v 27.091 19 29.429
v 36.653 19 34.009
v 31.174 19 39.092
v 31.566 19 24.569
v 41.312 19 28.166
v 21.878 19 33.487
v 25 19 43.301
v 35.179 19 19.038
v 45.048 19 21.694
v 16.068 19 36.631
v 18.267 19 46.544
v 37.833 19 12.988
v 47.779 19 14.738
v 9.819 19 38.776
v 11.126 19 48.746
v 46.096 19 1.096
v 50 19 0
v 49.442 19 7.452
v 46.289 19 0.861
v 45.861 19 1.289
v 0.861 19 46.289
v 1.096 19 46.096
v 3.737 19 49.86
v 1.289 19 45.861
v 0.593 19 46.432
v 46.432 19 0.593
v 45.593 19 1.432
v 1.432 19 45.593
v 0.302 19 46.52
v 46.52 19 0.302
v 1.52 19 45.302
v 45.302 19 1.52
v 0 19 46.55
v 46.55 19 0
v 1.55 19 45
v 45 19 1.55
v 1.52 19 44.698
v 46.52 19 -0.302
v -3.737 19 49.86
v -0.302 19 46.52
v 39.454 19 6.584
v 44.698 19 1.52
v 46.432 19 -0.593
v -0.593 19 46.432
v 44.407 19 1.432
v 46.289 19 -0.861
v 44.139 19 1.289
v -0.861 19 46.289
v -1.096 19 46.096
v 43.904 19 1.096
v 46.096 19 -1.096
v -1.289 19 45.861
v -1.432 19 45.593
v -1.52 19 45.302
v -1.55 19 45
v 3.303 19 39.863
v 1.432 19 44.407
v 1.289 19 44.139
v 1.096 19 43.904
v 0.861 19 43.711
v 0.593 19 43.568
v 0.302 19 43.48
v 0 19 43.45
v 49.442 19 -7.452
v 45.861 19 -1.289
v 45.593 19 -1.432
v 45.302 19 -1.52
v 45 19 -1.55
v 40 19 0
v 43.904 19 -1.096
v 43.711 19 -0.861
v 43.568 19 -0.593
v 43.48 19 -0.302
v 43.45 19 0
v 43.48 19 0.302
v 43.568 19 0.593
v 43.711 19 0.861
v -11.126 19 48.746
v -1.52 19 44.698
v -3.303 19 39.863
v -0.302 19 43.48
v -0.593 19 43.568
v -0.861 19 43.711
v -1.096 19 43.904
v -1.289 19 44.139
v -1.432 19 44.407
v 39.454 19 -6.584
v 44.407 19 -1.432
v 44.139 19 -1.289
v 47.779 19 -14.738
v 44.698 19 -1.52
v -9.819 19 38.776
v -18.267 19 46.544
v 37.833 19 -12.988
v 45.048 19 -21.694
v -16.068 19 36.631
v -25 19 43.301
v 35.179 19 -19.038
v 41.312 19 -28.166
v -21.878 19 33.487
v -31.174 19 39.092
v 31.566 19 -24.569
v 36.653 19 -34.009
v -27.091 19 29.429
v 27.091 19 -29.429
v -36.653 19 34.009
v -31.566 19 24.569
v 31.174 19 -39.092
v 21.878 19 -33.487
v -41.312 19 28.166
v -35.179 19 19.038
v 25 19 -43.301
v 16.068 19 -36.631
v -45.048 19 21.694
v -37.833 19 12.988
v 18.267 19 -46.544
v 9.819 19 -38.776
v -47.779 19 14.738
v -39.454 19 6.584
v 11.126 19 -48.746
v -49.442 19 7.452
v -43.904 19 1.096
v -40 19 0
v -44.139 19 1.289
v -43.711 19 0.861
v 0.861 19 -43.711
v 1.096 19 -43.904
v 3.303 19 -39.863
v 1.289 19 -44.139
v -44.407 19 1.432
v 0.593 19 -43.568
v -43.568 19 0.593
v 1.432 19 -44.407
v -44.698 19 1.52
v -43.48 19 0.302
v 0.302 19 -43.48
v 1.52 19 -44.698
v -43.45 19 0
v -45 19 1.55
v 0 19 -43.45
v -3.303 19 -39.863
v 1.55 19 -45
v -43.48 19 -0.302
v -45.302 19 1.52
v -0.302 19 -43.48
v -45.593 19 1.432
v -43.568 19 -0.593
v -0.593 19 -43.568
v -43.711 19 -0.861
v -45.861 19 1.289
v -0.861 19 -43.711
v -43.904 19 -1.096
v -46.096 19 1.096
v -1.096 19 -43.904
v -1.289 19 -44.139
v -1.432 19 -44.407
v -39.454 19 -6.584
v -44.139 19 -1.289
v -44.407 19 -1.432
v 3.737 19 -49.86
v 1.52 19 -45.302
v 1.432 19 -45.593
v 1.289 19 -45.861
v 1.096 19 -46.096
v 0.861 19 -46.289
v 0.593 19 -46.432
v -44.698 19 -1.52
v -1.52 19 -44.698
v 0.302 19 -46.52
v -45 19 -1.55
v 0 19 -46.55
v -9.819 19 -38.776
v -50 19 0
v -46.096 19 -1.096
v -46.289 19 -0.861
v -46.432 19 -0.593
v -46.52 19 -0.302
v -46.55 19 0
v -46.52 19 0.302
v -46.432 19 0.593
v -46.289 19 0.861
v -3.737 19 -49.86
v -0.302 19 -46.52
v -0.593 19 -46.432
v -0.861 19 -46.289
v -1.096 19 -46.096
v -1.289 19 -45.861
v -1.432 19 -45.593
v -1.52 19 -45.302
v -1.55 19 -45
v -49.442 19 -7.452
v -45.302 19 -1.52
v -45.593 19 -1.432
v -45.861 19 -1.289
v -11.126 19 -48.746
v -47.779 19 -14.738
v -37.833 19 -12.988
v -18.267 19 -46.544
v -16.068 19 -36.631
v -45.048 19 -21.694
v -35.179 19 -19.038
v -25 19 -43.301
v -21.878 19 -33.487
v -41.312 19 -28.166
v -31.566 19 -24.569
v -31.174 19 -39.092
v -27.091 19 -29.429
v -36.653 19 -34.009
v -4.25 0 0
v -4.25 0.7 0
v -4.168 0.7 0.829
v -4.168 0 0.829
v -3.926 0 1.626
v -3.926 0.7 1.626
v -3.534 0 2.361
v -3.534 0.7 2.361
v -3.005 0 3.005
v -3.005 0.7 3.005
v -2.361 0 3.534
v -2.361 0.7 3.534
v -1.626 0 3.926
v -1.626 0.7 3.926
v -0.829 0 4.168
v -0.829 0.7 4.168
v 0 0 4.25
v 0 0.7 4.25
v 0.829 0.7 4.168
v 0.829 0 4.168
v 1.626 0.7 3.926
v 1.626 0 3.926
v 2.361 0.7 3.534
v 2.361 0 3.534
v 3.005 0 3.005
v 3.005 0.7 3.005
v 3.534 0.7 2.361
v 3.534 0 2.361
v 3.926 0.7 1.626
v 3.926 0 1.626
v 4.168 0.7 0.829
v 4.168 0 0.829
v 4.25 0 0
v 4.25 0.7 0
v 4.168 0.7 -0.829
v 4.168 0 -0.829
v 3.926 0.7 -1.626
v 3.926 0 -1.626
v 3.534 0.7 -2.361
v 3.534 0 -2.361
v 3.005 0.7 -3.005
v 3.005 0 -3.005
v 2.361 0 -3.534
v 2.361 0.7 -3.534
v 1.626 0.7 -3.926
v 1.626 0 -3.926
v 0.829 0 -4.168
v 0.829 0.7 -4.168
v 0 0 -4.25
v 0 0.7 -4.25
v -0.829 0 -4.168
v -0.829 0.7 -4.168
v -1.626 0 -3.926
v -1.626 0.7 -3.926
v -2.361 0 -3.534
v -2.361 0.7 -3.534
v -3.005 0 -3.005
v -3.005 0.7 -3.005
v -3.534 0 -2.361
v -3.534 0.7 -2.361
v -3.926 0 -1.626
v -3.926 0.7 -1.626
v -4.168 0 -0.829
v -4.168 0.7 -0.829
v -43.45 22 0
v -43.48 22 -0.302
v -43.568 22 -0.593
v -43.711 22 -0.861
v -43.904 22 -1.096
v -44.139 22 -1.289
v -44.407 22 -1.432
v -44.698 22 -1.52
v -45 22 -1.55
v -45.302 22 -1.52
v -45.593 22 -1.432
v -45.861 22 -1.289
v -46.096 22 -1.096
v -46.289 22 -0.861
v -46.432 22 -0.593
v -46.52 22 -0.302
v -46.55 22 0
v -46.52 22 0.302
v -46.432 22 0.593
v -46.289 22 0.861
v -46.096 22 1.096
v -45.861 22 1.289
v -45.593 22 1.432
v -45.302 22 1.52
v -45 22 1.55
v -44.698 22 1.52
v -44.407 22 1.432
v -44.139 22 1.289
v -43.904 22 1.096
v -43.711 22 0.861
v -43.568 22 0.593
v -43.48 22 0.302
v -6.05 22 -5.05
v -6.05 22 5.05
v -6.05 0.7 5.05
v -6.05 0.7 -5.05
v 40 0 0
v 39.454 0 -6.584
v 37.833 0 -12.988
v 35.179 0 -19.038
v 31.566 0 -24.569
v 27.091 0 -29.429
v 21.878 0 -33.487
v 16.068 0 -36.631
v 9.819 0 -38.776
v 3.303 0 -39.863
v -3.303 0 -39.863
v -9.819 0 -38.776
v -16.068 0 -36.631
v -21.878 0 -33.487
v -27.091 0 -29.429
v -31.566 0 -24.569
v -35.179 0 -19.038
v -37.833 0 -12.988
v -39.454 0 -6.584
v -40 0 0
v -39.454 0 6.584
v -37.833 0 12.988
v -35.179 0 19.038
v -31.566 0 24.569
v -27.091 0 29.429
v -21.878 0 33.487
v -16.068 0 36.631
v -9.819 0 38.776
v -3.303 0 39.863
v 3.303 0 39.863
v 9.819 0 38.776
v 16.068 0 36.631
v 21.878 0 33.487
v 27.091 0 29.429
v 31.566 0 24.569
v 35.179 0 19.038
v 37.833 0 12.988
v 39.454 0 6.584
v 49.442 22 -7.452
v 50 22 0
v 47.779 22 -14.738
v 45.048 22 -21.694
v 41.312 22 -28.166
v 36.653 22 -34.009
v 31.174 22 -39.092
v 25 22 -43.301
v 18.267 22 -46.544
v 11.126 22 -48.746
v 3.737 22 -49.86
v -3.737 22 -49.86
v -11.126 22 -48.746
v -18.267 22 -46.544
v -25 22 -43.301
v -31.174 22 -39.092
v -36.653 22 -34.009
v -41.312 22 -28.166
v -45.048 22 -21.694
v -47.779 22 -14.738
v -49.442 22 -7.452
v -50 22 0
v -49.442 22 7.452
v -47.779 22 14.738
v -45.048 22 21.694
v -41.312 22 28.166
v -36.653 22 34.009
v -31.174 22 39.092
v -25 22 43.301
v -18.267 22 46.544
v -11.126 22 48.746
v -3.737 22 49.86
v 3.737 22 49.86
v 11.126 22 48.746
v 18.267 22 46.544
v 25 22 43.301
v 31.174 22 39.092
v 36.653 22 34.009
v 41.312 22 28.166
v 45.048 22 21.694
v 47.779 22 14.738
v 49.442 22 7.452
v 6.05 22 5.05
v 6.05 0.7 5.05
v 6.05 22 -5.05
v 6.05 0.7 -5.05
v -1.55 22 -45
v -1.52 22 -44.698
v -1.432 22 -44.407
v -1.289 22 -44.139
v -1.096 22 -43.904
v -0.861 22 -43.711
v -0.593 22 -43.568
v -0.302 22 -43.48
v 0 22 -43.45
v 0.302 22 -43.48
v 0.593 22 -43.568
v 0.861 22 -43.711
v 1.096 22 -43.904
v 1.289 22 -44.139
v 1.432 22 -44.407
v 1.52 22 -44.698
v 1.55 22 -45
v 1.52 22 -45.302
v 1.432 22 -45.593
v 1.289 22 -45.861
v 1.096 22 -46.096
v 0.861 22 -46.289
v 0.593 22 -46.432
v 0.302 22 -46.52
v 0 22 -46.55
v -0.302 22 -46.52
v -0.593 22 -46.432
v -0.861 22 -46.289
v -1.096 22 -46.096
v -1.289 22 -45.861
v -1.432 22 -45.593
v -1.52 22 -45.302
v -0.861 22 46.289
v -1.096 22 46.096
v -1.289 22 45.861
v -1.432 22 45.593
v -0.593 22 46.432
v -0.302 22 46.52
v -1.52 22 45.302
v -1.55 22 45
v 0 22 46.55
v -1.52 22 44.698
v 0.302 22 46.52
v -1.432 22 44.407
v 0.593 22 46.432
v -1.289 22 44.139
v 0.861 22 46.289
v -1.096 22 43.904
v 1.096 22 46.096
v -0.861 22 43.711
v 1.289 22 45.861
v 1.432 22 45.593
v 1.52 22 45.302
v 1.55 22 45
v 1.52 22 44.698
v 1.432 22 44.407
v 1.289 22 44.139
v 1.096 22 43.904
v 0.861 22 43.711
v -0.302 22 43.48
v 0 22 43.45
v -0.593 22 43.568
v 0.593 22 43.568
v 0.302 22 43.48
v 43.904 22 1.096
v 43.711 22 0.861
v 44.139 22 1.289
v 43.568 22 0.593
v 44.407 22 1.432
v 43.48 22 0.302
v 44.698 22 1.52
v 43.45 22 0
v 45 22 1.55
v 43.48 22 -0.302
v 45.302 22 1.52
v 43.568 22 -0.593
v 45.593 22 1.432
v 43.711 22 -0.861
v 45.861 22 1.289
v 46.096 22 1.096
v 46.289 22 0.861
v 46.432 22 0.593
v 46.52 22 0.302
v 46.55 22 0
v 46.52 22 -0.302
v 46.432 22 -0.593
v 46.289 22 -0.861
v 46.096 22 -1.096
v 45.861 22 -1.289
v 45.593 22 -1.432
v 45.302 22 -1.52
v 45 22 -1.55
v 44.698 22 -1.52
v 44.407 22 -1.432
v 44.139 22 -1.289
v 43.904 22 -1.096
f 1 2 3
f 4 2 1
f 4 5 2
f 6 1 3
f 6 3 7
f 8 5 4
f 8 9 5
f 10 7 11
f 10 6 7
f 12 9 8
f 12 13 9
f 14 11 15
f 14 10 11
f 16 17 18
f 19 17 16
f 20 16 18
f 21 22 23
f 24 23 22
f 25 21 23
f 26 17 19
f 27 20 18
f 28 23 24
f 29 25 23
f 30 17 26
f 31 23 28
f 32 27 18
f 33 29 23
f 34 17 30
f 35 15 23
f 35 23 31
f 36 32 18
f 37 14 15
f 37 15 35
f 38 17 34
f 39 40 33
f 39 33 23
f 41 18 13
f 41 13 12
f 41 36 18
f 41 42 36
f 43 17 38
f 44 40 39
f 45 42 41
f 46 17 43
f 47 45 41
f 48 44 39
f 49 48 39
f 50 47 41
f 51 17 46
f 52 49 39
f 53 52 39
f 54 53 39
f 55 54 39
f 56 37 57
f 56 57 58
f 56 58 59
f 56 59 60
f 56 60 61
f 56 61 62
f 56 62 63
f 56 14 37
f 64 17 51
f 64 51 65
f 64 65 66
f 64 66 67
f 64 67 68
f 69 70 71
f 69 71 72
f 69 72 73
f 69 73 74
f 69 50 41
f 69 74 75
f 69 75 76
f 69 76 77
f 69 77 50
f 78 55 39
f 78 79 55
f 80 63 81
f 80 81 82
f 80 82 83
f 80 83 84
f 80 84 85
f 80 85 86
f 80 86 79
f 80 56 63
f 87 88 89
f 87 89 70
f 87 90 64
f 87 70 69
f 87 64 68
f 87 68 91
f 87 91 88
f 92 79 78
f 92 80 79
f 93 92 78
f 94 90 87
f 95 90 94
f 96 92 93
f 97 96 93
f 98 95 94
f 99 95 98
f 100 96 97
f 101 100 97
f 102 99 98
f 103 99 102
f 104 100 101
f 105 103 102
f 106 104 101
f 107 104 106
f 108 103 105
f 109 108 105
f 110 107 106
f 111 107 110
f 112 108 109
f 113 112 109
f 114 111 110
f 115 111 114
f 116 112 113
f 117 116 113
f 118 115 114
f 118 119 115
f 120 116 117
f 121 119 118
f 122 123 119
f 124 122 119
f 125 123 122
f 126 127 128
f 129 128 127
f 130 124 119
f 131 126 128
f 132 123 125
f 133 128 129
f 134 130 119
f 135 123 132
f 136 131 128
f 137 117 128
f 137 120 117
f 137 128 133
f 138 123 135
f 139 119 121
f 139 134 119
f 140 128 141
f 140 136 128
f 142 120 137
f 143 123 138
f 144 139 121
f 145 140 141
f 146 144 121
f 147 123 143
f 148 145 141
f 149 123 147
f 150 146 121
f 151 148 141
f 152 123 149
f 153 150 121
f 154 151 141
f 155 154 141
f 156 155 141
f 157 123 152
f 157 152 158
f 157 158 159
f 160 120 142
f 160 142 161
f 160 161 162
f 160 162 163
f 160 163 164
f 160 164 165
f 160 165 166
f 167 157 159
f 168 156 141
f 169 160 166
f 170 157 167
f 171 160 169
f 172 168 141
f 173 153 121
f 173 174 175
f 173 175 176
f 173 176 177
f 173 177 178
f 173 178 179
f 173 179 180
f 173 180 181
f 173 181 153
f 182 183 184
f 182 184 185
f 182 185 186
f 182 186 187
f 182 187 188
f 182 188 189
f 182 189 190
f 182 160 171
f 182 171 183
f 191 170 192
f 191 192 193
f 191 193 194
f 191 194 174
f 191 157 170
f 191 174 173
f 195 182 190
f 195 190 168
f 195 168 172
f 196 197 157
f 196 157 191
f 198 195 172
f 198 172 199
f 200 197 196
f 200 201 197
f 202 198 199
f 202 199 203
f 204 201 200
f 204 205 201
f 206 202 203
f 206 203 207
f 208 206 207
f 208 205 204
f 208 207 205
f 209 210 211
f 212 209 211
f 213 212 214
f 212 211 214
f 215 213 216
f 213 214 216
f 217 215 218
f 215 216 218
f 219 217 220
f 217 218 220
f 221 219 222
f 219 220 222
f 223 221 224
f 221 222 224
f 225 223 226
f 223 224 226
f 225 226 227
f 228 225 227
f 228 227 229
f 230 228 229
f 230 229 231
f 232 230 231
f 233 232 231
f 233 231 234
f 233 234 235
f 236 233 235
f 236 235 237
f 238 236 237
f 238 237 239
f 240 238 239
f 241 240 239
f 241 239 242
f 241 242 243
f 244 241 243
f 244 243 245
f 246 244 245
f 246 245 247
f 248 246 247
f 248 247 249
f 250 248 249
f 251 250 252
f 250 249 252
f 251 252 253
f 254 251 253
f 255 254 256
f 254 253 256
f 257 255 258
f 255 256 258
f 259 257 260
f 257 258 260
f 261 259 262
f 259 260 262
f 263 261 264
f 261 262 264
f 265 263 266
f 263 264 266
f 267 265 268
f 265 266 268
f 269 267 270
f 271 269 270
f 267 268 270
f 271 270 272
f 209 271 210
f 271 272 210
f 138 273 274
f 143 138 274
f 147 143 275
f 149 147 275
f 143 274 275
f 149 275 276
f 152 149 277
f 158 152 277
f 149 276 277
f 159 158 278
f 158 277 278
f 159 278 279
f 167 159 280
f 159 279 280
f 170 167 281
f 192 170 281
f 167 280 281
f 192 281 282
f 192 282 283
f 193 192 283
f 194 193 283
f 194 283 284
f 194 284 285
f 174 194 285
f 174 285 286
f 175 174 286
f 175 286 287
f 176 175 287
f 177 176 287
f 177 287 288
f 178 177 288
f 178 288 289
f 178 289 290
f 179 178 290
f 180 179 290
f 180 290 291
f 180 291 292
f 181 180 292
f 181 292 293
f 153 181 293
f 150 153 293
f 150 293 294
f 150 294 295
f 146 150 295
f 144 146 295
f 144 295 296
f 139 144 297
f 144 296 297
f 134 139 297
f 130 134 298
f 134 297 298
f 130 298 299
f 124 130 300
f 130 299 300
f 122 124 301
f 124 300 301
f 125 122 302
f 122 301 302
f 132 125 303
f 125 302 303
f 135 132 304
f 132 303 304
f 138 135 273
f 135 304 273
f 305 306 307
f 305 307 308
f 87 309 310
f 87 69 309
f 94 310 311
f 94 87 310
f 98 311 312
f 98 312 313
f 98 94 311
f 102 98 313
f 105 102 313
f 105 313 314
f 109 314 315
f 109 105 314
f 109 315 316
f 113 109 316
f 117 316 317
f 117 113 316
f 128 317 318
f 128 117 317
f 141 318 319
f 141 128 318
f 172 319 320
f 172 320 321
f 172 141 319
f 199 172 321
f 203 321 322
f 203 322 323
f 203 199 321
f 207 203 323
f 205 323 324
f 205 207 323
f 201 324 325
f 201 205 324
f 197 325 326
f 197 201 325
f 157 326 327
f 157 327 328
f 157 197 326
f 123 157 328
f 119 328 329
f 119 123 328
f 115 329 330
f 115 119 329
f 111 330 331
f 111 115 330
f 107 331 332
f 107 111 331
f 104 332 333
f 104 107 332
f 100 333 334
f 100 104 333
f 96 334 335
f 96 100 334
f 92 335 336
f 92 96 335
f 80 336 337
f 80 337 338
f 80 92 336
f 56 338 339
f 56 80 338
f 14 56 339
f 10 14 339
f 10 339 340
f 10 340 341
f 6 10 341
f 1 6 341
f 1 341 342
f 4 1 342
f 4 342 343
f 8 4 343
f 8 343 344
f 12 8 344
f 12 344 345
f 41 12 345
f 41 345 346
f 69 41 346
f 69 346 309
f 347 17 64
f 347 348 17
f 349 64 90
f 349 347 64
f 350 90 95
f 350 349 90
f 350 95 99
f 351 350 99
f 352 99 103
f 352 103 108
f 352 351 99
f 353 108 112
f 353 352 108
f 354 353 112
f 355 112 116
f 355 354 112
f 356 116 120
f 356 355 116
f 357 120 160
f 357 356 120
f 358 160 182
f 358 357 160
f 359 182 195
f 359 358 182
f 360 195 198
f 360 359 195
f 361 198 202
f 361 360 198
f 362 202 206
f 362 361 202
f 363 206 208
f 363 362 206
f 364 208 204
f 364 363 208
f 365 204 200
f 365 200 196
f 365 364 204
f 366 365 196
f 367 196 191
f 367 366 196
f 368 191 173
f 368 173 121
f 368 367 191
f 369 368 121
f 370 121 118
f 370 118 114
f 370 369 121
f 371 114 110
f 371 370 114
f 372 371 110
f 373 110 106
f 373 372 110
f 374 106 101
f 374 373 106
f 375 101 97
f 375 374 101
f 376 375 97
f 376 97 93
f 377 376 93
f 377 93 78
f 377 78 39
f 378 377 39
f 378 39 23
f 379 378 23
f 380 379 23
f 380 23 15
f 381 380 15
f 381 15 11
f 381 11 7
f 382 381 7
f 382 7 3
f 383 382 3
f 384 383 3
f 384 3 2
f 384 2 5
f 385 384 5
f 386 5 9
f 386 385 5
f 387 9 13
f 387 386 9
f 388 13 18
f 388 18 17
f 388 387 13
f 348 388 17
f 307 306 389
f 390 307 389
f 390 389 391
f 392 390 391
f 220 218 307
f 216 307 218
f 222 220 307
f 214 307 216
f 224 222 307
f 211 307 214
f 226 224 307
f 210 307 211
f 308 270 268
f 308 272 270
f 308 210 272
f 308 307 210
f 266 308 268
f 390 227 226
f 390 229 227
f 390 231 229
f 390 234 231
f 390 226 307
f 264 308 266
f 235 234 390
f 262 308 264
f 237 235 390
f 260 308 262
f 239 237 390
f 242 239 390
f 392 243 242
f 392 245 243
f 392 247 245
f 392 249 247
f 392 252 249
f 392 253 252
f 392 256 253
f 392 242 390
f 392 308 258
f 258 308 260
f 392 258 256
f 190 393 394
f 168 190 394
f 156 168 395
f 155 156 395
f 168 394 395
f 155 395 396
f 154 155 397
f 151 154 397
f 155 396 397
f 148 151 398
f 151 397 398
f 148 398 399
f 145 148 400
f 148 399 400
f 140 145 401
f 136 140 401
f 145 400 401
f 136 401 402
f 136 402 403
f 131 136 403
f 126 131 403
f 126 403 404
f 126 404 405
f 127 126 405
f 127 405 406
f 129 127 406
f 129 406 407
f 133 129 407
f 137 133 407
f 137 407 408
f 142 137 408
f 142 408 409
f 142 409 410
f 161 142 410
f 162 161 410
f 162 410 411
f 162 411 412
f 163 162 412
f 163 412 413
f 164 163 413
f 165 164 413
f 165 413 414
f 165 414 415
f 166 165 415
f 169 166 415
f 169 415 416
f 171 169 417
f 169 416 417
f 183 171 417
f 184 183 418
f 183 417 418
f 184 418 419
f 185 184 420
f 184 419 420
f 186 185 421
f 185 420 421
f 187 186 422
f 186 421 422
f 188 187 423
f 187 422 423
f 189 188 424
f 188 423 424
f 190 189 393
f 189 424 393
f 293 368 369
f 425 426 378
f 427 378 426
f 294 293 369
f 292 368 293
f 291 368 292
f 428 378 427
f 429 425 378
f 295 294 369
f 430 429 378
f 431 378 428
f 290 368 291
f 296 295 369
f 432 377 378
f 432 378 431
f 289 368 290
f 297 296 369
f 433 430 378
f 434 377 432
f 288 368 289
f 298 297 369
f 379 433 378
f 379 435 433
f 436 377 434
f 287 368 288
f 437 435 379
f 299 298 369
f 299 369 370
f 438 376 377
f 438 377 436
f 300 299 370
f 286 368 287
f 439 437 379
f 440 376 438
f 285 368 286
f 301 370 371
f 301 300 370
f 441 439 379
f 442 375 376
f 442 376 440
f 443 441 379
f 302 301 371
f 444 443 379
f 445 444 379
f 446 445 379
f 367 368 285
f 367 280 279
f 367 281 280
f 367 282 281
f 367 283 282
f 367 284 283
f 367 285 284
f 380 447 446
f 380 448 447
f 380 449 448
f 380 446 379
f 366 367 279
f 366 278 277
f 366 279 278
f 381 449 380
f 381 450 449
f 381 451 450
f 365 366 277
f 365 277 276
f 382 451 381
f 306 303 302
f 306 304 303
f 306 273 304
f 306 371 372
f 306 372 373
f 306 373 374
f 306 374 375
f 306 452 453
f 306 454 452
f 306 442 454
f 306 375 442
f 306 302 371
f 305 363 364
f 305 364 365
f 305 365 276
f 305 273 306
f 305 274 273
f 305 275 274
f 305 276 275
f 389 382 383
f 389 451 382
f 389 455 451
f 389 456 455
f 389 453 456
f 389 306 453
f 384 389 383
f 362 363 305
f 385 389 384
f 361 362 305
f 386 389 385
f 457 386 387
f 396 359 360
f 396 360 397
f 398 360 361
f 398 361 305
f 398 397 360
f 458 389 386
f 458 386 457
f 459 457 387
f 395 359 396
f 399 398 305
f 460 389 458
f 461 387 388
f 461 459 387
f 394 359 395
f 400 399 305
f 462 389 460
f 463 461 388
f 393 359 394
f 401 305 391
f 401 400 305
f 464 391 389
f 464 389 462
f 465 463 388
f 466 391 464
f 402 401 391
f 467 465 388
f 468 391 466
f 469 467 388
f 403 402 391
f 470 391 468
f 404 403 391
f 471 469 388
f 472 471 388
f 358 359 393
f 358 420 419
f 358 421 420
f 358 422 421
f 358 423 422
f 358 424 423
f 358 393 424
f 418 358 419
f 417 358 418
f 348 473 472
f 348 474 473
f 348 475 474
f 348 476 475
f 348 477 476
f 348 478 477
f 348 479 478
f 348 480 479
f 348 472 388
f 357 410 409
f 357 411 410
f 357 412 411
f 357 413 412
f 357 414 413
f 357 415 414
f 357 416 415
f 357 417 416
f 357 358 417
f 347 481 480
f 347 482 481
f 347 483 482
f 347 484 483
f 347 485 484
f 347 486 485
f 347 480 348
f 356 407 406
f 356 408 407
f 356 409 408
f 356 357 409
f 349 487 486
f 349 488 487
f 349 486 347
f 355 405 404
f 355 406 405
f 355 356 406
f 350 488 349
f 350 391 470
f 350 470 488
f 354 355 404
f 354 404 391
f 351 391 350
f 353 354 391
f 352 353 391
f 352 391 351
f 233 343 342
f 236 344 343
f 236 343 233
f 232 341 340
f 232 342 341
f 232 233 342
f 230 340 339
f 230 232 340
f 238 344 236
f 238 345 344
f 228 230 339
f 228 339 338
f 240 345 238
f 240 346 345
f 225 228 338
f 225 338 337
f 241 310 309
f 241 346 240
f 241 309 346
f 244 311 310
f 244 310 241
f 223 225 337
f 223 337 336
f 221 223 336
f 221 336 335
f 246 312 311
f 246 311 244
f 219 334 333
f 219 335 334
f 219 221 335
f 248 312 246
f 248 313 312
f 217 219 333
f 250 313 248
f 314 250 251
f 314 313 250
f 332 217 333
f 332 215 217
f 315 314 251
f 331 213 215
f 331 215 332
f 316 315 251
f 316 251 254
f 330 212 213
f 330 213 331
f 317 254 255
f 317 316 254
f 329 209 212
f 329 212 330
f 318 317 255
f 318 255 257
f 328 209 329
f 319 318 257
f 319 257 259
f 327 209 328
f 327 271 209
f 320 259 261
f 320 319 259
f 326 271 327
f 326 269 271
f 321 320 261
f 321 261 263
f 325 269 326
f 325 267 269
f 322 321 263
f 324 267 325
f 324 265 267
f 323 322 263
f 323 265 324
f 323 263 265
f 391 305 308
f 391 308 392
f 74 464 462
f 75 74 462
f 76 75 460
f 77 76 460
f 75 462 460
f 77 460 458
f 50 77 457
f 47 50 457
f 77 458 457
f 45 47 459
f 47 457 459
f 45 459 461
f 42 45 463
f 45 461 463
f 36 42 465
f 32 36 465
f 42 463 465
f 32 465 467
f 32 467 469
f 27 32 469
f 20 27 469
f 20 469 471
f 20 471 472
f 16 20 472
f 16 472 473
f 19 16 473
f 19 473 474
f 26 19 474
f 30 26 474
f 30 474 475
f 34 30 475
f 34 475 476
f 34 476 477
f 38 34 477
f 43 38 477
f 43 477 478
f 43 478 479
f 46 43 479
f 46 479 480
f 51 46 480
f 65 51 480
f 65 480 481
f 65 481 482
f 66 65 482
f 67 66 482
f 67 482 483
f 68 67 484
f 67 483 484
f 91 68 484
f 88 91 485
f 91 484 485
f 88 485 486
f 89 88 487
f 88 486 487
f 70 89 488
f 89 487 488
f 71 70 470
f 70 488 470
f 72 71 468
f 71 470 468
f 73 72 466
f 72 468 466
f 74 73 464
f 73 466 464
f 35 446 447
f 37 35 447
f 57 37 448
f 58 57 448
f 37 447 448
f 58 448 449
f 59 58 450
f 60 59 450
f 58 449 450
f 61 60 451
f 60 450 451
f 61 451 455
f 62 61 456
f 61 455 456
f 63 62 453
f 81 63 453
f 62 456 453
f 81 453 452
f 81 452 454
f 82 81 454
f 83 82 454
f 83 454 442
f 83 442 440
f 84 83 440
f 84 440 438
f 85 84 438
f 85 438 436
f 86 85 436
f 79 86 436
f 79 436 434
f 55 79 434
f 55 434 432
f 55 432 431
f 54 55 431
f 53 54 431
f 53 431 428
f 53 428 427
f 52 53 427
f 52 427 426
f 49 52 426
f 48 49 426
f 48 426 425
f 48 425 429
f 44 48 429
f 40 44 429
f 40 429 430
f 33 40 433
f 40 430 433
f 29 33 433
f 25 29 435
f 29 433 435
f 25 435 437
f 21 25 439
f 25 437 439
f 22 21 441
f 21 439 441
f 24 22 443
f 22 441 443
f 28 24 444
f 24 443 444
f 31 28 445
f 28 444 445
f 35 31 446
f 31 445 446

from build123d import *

# Parameters (mm, degrees)
ESQUISSE2_W             = 12.1
ESQUISSE2_H             = 10.1
ENL_V_MAT_EXTRU_1_DEPTH = 21.3
ESQUISSE3_R             = 1.55
ENL_V_MAT_EXTRU_2_DEPTH = 21.3
ESQUISSE5_R             = 4.25
ENL_V_MAT_EXTRU_3_DEPTH = 21.3


with BuildPart() as part:
    # Esquisse1 → Révolution1 (revolve)
    with BuildSketch(Plane.XY):
        Polygon((0, 0), (40, 0), (40, 19), (50, 19), (50, 22), (40, 22), (0, 22), align=None)
    revolve(axis=Axis((0, 0, 0), (0, 1, 0)))

    # Esquisse2 → Enlèv. mat.-Extru.1 (cut)
    with BuildSketch(Plane(origin=(0, 22, 0), x_dir=(1, 0, 0), z_dir=(0, 1, 0))):
        Rectangle(ESQUISSE2_W, ESQUISSE2_H)
    extrude(amount=-ENL_V_MAT_EXTRU_1_DEPTH, mode=Mode.SUBTRACT)

    # Esquisse3 → Enlèv. mat.-Extru.2 (cut)
    with BuildSketch(Plane(origin=(0, 22, 0), x_dir=(1, 0, 0), z_dir=(0, 1, 0))):
        with Locations(Location((45, 0, 0), (0, 0, 180))):
            Circle(ESQUISSE3_R)
        with Locations((-45, 0)):
            Circle(ESQUISSE3_R)
        with Locations(Location((0, 45, 0), (0, 0, 180))):
            Circle(ESQUISSE3_R)
        with Locations((0, -45)):
            Circle(ESQUISSE3_R)
    extrude(amount=-ENL_V_MAT_EXTRU_2_DEPTH, mode=Mode.SUBTRACT)

    # Esquisse5 → Enlèv. mat.-Extru.3 (cut)
    with BuildSketch(Plane(origin=(0, 0.7, 0), x_dir=(1, 0, 0), z_dir=(0, 1, 0))):
        with Locations(Location((0, 0, 0), (0, 0, 180))):
            Circle(ESQUISSE5_R)
    extrude(amount=-ENL_V_MAT_EXTRU_3_DEPTH, mode=Mode.SUBTRACT)


solid = part.part
